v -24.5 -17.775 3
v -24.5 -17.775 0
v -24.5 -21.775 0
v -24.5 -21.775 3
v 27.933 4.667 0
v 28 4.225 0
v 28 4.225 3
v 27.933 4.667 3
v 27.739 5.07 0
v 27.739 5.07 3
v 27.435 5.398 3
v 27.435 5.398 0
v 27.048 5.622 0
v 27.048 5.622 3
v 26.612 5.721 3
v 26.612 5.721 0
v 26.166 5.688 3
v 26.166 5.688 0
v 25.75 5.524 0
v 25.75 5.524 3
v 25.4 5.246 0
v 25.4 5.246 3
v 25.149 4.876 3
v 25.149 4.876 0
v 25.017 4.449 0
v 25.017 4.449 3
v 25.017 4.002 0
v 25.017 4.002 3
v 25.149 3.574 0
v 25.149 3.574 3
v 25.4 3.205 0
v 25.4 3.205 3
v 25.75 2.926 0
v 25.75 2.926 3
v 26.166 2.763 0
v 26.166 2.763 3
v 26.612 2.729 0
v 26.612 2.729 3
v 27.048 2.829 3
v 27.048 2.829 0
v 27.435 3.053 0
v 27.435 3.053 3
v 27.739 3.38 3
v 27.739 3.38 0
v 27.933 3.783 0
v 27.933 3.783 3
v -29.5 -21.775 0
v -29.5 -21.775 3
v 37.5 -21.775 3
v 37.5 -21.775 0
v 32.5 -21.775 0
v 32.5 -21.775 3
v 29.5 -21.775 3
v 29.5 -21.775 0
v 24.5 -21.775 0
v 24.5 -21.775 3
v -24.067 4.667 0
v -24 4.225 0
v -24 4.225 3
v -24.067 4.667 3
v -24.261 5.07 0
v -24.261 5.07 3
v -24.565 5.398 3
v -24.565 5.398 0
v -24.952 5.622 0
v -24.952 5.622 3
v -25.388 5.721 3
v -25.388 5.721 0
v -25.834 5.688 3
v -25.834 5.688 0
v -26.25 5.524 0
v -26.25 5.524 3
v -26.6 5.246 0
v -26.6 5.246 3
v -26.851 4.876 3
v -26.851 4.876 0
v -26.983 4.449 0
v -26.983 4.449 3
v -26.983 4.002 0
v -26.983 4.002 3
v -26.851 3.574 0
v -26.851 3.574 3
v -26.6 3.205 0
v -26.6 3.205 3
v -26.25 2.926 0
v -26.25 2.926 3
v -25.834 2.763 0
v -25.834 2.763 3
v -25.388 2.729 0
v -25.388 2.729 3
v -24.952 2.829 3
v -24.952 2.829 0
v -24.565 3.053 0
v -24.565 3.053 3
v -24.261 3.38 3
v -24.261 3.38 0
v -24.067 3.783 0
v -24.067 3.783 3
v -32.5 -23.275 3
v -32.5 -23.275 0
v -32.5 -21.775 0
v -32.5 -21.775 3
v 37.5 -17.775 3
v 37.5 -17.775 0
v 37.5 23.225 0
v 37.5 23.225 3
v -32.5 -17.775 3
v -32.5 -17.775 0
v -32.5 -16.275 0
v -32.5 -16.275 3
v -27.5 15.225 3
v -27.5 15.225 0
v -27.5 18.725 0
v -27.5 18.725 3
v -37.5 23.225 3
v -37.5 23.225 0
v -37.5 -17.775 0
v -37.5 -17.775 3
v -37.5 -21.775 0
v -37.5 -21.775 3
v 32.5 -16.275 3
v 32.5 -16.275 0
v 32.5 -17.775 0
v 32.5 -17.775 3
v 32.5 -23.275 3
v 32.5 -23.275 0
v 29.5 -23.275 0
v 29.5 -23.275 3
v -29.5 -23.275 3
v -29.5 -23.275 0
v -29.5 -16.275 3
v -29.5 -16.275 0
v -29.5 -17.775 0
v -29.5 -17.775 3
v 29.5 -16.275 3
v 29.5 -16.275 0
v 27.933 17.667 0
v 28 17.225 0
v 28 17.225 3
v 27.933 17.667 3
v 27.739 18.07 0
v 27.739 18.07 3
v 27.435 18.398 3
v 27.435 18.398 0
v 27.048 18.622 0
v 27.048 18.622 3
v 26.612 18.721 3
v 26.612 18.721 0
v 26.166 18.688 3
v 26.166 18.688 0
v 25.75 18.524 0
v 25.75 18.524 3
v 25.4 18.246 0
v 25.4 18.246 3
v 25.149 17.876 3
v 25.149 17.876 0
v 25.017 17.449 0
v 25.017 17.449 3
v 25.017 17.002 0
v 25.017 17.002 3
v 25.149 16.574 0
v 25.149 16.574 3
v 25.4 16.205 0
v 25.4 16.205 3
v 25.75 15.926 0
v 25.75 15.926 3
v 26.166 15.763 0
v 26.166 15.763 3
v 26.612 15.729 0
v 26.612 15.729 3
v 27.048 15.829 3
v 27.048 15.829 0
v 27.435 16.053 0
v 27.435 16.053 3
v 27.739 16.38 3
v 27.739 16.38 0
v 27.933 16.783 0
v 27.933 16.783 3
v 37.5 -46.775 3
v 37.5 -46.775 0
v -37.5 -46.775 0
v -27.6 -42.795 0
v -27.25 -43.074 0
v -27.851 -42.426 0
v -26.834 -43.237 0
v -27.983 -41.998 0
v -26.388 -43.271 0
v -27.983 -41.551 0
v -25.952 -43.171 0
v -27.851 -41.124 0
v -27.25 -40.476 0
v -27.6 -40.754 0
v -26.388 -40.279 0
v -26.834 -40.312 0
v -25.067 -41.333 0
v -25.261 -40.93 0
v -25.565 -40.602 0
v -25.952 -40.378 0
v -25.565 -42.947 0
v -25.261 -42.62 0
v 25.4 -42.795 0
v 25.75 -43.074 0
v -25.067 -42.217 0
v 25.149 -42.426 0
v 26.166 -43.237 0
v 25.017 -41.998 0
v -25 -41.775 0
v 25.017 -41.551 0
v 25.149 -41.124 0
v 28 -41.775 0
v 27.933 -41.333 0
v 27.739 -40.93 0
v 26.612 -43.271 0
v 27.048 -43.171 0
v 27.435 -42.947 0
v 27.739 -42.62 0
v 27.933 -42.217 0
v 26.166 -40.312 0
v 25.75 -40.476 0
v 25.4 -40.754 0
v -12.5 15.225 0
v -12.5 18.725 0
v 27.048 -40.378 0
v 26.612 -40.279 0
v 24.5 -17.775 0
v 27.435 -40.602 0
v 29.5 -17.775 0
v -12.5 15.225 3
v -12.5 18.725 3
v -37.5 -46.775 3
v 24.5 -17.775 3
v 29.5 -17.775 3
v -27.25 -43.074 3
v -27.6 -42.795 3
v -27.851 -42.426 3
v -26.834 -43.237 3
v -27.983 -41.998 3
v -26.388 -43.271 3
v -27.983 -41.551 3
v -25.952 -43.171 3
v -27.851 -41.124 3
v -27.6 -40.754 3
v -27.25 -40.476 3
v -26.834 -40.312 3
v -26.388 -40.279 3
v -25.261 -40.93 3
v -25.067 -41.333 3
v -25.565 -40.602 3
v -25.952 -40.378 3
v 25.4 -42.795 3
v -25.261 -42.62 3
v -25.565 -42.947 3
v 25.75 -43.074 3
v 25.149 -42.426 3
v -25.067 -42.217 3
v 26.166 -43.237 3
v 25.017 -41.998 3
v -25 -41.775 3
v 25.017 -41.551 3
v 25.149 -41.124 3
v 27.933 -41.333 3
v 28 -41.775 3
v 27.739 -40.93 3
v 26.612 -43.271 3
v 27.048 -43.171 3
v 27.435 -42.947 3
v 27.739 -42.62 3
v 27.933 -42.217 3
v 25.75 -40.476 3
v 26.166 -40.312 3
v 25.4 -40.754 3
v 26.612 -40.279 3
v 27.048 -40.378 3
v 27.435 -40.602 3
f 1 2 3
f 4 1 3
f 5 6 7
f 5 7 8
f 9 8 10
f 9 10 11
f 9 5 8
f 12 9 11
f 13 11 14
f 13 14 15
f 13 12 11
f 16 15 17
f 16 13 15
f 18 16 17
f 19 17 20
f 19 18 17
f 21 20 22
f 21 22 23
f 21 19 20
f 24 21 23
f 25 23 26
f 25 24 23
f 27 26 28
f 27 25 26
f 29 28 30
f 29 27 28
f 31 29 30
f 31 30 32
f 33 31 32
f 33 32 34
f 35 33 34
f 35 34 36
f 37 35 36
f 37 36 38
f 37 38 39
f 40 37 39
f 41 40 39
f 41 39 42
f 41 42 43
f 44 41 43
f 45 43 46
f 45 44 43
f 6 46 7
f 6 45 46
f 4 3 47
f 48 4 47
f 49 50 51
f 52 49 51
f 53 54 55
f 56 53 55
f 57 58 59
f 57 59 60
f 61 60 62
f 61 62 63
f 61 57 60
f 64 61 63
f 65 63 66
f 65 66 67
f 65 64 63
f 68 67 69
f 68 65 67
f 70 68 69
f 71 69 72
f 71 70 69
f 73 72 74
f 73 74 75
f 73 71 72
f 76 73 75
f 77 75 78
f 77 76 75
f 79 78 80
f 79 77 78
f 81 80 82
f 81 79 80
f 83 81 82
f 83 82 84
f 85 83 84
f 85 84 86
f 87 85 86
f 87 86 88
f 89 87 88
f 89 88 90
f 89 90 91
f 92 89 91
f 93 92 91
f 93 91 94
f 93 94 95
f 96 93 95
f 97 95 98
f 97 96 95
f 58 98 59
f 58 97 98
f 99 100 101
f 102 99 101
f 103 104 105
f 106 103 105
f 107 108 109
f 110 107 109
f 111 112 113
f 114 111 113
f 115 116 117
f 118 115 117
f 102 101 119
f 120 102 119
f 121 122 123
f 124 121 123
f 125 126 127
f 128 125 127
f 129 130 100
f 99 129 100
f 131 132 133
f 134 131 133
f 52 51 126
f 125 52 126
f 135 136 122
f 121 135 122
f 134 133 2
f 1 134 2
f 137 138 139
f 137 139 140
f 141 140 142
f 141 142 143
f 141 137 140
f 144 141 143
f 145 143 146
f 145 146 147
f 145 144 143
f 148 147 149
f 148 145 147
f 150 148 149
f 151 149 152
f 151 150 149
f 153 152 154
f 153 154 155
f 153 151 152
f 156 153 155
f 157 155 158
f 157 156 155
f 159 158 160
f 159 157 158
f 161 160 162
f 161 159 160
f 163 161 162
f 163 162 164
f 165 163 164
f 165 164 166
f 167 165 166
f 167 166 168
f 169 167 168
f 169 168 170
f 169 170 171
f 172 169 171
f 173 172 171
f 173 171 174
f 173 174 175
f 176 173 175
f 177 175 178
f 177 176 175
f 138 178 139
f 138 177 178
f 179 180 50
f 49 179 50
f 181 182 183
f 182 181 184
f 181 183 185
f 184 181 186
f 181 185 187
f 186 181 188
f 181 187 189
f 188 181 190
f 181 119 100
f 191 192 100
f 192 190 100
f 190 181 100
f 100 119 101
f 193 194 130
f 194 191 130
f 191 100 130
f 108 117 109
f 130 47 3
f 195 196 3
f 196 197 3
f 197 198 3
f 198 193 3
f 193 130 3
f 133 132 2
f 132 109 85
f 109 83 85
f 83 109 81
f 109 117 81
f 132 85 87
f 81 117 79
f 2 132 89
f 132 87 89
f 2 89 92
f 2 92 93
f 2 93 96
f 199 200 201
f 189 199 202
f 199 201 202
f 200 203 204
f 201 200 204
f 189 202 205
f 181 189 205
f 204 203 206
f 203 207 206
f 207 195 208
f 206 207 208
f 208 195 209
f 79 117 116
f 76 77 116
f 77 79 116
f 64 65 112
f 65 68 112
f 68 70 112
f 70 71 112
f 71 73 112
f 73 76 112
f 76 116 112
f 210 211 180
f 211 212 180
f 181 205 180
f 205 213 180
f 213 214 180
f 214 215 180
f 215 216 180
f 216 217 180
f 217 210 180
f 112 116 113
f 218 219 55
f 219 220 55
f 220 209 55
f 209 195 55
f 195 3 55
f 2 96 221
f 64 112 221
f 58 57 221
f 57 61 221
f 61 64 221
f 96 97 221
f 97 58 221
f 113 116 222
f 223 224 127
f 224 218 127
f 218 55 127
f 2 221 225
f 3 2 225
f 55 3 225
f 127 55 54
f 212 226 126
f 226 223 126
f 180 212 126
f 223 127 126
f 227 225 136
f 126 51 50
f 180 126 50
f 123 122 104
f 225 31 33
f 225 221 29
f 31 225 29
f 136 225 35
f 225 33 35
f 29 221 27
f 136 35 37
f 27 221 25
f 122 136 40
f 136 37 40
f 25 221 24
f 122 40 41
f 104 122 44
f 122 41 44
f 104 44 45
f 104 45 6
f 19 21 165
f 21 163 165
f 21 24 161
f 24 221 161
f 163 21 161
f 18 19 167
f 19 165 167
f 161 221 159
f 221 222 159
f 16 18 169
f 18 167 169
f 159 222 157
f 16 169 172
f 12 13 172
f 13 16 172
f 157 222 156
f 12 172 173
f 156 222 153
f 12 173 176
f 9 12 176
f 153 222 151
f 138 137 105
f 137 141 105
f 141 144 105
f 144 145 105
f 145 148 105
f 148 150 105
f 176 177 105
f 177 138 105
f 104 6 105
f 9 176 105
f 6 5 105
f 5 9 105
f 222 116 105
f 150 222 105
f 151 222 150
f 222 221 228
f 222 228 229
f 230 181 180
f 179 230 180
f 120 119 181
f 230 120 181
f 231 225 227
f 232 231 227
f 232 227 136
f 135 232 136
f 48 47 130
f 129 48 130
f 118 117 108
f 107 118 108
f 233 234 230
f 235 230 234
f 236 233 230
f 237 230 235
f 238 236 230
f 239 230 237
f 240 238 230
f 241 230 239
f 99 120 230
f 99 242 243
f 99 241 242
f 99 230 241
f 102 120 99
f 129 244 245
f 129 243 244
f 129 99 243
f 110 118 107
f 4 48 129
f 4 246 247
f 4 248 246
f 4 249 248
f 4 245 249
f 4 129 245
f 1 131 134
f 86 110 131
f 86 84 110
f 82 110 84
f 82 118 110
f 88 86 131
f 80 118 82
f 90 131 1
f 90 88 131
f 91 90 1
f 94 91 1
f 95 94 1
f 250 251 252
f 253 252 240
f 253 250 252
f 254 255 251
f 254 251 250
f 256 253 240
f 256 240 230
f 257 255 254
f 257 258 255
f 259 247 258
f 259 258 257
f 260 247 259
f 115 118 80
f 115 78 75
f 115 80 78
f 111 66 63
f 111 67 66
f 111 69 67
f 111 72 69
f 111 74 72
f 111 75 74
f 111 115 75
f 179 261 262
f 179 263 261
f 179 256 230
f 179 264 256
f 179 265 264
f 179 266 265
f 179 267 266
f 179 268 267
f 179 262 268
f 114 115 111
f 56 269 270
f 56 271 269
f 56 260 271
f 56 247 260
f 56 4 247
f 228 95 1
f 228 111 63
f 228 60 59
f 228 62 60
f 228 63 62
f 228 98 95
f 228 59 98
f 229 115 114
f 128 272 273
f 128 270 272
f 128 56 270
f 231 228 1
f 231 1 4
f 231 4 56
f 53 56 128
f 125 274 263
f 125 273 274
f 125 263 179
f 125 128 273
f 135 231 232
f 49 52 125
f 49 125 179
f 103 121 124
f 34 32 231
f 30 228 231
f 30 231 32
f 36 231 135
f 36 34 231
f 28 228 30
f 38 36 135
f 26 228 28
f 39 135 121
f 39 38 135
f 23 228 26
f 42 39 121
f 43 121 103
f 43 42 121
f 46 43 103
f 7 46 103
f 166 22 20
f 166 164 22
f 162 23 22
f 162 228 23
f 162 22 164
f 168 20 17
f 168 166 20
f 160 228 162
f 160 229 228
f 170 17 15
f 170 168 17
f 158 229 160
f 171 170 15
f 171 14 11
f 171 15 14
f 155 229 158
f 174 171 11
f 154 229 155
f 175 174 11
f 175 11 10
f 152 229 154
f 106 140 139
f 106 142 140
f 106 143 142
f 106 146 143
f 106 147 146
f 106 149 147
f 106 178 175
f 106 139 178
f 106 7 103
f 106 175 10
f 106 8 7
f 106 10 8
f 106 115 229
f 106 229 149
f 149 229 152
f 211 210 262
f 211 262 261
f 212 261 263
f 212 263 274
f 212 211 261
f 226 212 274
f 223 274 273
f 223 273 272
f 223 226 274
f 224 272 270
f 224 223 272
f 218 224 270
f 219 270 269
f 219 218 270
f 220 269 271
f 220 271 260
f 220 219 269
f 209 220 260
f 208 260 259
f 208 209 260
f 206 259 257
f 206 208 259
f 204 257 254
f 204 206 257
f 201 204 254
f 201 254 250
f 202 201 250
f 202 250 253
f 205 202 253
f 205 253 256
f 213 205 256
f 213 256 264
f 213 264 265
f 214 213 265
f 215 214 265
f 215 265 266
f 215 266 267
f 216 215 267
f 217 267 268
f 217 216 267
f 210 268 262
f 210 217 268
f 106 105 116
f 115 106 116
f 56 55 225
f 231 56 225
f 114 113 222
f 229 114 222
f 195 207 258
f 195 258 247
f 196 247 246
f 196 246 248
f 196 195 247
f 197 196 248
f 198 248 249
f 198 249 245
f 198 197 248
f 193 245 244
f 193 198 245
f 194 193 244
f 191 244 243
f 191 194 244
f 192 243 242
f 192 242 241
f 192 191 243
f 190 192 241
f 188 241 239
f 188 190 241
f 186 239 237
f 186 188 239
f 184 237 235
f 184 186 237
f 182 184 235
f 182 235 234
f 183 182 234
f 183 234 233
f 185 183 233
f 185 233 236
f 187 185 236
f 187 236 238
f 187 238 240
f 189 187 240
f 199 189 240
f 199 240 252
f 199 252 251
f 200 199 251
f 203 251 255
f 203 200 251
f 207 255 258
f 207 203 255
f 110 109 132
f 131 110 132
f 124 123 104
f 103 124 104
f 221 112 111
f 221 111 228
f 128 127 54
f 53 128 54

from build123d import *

# Parameters (mm, degrees)
ESQUISSE1_R        = 1.5
ESQUISSE1_W        = 15
ESQUISSE1_H        = 3.5
BOSS_EXTRU_1_DEPTH = 3


with BuildPart() as part:
    # Esquisse1 → Boss.-Extru.1 (new body)
    with BuildSketch(Plane.XY):
        Polygon((-37.5, -21.774747117), (-37.5, -46.774747117), (37.5, -46.774747117), (37.5, -21.774747117), (32.5, -21.774747117), (32.5, -23.274747117), (29.5, -23.274747117), (29.5, -21.774747117), (24.5, -21.774747117), (24.5, -17.774747117), (29.5, -17.774747117), (29.5, -16.274747117), (32.5, -16.274747117), (32.5, -17.774747117), (37.5, -17.774747117), (37.5, 23.225252883), (-37.5, 23.225252883), (-37.5, -17.774747117), (-32.5, -17.774747117), (-32.5, -16.274747117), (-29.5, -16.274747117), (-29.5, -17.774747117), (-24.5, -17.774747117), (-24.5, -21.774747117), (-29.5, -21.774747117), (-29.5, -23.274747117), (-32.5, -23.274747117), (-32.5, -21.774747117), align=None)
        with Locations((-26.5, -41.774747117)):
            Circle(ESQUISSE1_R, mode=Mode.SUBTRACT)
        with Locations((26.5, -41.774747117)):
            Circle(ESQUISSE1_R, mode=Mode.SUBTRACT)
        with Locations((-25.5, 4.225252883)):
            Circle(ESQUISSE1_R, mode=Mode.SUBTRACT)
        with Locations((-20, 16.975252883)):
            Rectangle(ESQUISSE1_W, ESQUISSE1_H, mode=Mode.SUBTRACT)
        with Locations((26.5, 4.225252883)):
            Circle(ESQUISSE1_R, mode=Mode.SUBTRACT)
        with Locations((26.5, 17.225252883)):
            Circle(ESQUISSE1_R, mode=Mode.SUBTRACT)
    extrude(amount=BOSS_EXTRU_1_DEPTH)


solid = part.part
